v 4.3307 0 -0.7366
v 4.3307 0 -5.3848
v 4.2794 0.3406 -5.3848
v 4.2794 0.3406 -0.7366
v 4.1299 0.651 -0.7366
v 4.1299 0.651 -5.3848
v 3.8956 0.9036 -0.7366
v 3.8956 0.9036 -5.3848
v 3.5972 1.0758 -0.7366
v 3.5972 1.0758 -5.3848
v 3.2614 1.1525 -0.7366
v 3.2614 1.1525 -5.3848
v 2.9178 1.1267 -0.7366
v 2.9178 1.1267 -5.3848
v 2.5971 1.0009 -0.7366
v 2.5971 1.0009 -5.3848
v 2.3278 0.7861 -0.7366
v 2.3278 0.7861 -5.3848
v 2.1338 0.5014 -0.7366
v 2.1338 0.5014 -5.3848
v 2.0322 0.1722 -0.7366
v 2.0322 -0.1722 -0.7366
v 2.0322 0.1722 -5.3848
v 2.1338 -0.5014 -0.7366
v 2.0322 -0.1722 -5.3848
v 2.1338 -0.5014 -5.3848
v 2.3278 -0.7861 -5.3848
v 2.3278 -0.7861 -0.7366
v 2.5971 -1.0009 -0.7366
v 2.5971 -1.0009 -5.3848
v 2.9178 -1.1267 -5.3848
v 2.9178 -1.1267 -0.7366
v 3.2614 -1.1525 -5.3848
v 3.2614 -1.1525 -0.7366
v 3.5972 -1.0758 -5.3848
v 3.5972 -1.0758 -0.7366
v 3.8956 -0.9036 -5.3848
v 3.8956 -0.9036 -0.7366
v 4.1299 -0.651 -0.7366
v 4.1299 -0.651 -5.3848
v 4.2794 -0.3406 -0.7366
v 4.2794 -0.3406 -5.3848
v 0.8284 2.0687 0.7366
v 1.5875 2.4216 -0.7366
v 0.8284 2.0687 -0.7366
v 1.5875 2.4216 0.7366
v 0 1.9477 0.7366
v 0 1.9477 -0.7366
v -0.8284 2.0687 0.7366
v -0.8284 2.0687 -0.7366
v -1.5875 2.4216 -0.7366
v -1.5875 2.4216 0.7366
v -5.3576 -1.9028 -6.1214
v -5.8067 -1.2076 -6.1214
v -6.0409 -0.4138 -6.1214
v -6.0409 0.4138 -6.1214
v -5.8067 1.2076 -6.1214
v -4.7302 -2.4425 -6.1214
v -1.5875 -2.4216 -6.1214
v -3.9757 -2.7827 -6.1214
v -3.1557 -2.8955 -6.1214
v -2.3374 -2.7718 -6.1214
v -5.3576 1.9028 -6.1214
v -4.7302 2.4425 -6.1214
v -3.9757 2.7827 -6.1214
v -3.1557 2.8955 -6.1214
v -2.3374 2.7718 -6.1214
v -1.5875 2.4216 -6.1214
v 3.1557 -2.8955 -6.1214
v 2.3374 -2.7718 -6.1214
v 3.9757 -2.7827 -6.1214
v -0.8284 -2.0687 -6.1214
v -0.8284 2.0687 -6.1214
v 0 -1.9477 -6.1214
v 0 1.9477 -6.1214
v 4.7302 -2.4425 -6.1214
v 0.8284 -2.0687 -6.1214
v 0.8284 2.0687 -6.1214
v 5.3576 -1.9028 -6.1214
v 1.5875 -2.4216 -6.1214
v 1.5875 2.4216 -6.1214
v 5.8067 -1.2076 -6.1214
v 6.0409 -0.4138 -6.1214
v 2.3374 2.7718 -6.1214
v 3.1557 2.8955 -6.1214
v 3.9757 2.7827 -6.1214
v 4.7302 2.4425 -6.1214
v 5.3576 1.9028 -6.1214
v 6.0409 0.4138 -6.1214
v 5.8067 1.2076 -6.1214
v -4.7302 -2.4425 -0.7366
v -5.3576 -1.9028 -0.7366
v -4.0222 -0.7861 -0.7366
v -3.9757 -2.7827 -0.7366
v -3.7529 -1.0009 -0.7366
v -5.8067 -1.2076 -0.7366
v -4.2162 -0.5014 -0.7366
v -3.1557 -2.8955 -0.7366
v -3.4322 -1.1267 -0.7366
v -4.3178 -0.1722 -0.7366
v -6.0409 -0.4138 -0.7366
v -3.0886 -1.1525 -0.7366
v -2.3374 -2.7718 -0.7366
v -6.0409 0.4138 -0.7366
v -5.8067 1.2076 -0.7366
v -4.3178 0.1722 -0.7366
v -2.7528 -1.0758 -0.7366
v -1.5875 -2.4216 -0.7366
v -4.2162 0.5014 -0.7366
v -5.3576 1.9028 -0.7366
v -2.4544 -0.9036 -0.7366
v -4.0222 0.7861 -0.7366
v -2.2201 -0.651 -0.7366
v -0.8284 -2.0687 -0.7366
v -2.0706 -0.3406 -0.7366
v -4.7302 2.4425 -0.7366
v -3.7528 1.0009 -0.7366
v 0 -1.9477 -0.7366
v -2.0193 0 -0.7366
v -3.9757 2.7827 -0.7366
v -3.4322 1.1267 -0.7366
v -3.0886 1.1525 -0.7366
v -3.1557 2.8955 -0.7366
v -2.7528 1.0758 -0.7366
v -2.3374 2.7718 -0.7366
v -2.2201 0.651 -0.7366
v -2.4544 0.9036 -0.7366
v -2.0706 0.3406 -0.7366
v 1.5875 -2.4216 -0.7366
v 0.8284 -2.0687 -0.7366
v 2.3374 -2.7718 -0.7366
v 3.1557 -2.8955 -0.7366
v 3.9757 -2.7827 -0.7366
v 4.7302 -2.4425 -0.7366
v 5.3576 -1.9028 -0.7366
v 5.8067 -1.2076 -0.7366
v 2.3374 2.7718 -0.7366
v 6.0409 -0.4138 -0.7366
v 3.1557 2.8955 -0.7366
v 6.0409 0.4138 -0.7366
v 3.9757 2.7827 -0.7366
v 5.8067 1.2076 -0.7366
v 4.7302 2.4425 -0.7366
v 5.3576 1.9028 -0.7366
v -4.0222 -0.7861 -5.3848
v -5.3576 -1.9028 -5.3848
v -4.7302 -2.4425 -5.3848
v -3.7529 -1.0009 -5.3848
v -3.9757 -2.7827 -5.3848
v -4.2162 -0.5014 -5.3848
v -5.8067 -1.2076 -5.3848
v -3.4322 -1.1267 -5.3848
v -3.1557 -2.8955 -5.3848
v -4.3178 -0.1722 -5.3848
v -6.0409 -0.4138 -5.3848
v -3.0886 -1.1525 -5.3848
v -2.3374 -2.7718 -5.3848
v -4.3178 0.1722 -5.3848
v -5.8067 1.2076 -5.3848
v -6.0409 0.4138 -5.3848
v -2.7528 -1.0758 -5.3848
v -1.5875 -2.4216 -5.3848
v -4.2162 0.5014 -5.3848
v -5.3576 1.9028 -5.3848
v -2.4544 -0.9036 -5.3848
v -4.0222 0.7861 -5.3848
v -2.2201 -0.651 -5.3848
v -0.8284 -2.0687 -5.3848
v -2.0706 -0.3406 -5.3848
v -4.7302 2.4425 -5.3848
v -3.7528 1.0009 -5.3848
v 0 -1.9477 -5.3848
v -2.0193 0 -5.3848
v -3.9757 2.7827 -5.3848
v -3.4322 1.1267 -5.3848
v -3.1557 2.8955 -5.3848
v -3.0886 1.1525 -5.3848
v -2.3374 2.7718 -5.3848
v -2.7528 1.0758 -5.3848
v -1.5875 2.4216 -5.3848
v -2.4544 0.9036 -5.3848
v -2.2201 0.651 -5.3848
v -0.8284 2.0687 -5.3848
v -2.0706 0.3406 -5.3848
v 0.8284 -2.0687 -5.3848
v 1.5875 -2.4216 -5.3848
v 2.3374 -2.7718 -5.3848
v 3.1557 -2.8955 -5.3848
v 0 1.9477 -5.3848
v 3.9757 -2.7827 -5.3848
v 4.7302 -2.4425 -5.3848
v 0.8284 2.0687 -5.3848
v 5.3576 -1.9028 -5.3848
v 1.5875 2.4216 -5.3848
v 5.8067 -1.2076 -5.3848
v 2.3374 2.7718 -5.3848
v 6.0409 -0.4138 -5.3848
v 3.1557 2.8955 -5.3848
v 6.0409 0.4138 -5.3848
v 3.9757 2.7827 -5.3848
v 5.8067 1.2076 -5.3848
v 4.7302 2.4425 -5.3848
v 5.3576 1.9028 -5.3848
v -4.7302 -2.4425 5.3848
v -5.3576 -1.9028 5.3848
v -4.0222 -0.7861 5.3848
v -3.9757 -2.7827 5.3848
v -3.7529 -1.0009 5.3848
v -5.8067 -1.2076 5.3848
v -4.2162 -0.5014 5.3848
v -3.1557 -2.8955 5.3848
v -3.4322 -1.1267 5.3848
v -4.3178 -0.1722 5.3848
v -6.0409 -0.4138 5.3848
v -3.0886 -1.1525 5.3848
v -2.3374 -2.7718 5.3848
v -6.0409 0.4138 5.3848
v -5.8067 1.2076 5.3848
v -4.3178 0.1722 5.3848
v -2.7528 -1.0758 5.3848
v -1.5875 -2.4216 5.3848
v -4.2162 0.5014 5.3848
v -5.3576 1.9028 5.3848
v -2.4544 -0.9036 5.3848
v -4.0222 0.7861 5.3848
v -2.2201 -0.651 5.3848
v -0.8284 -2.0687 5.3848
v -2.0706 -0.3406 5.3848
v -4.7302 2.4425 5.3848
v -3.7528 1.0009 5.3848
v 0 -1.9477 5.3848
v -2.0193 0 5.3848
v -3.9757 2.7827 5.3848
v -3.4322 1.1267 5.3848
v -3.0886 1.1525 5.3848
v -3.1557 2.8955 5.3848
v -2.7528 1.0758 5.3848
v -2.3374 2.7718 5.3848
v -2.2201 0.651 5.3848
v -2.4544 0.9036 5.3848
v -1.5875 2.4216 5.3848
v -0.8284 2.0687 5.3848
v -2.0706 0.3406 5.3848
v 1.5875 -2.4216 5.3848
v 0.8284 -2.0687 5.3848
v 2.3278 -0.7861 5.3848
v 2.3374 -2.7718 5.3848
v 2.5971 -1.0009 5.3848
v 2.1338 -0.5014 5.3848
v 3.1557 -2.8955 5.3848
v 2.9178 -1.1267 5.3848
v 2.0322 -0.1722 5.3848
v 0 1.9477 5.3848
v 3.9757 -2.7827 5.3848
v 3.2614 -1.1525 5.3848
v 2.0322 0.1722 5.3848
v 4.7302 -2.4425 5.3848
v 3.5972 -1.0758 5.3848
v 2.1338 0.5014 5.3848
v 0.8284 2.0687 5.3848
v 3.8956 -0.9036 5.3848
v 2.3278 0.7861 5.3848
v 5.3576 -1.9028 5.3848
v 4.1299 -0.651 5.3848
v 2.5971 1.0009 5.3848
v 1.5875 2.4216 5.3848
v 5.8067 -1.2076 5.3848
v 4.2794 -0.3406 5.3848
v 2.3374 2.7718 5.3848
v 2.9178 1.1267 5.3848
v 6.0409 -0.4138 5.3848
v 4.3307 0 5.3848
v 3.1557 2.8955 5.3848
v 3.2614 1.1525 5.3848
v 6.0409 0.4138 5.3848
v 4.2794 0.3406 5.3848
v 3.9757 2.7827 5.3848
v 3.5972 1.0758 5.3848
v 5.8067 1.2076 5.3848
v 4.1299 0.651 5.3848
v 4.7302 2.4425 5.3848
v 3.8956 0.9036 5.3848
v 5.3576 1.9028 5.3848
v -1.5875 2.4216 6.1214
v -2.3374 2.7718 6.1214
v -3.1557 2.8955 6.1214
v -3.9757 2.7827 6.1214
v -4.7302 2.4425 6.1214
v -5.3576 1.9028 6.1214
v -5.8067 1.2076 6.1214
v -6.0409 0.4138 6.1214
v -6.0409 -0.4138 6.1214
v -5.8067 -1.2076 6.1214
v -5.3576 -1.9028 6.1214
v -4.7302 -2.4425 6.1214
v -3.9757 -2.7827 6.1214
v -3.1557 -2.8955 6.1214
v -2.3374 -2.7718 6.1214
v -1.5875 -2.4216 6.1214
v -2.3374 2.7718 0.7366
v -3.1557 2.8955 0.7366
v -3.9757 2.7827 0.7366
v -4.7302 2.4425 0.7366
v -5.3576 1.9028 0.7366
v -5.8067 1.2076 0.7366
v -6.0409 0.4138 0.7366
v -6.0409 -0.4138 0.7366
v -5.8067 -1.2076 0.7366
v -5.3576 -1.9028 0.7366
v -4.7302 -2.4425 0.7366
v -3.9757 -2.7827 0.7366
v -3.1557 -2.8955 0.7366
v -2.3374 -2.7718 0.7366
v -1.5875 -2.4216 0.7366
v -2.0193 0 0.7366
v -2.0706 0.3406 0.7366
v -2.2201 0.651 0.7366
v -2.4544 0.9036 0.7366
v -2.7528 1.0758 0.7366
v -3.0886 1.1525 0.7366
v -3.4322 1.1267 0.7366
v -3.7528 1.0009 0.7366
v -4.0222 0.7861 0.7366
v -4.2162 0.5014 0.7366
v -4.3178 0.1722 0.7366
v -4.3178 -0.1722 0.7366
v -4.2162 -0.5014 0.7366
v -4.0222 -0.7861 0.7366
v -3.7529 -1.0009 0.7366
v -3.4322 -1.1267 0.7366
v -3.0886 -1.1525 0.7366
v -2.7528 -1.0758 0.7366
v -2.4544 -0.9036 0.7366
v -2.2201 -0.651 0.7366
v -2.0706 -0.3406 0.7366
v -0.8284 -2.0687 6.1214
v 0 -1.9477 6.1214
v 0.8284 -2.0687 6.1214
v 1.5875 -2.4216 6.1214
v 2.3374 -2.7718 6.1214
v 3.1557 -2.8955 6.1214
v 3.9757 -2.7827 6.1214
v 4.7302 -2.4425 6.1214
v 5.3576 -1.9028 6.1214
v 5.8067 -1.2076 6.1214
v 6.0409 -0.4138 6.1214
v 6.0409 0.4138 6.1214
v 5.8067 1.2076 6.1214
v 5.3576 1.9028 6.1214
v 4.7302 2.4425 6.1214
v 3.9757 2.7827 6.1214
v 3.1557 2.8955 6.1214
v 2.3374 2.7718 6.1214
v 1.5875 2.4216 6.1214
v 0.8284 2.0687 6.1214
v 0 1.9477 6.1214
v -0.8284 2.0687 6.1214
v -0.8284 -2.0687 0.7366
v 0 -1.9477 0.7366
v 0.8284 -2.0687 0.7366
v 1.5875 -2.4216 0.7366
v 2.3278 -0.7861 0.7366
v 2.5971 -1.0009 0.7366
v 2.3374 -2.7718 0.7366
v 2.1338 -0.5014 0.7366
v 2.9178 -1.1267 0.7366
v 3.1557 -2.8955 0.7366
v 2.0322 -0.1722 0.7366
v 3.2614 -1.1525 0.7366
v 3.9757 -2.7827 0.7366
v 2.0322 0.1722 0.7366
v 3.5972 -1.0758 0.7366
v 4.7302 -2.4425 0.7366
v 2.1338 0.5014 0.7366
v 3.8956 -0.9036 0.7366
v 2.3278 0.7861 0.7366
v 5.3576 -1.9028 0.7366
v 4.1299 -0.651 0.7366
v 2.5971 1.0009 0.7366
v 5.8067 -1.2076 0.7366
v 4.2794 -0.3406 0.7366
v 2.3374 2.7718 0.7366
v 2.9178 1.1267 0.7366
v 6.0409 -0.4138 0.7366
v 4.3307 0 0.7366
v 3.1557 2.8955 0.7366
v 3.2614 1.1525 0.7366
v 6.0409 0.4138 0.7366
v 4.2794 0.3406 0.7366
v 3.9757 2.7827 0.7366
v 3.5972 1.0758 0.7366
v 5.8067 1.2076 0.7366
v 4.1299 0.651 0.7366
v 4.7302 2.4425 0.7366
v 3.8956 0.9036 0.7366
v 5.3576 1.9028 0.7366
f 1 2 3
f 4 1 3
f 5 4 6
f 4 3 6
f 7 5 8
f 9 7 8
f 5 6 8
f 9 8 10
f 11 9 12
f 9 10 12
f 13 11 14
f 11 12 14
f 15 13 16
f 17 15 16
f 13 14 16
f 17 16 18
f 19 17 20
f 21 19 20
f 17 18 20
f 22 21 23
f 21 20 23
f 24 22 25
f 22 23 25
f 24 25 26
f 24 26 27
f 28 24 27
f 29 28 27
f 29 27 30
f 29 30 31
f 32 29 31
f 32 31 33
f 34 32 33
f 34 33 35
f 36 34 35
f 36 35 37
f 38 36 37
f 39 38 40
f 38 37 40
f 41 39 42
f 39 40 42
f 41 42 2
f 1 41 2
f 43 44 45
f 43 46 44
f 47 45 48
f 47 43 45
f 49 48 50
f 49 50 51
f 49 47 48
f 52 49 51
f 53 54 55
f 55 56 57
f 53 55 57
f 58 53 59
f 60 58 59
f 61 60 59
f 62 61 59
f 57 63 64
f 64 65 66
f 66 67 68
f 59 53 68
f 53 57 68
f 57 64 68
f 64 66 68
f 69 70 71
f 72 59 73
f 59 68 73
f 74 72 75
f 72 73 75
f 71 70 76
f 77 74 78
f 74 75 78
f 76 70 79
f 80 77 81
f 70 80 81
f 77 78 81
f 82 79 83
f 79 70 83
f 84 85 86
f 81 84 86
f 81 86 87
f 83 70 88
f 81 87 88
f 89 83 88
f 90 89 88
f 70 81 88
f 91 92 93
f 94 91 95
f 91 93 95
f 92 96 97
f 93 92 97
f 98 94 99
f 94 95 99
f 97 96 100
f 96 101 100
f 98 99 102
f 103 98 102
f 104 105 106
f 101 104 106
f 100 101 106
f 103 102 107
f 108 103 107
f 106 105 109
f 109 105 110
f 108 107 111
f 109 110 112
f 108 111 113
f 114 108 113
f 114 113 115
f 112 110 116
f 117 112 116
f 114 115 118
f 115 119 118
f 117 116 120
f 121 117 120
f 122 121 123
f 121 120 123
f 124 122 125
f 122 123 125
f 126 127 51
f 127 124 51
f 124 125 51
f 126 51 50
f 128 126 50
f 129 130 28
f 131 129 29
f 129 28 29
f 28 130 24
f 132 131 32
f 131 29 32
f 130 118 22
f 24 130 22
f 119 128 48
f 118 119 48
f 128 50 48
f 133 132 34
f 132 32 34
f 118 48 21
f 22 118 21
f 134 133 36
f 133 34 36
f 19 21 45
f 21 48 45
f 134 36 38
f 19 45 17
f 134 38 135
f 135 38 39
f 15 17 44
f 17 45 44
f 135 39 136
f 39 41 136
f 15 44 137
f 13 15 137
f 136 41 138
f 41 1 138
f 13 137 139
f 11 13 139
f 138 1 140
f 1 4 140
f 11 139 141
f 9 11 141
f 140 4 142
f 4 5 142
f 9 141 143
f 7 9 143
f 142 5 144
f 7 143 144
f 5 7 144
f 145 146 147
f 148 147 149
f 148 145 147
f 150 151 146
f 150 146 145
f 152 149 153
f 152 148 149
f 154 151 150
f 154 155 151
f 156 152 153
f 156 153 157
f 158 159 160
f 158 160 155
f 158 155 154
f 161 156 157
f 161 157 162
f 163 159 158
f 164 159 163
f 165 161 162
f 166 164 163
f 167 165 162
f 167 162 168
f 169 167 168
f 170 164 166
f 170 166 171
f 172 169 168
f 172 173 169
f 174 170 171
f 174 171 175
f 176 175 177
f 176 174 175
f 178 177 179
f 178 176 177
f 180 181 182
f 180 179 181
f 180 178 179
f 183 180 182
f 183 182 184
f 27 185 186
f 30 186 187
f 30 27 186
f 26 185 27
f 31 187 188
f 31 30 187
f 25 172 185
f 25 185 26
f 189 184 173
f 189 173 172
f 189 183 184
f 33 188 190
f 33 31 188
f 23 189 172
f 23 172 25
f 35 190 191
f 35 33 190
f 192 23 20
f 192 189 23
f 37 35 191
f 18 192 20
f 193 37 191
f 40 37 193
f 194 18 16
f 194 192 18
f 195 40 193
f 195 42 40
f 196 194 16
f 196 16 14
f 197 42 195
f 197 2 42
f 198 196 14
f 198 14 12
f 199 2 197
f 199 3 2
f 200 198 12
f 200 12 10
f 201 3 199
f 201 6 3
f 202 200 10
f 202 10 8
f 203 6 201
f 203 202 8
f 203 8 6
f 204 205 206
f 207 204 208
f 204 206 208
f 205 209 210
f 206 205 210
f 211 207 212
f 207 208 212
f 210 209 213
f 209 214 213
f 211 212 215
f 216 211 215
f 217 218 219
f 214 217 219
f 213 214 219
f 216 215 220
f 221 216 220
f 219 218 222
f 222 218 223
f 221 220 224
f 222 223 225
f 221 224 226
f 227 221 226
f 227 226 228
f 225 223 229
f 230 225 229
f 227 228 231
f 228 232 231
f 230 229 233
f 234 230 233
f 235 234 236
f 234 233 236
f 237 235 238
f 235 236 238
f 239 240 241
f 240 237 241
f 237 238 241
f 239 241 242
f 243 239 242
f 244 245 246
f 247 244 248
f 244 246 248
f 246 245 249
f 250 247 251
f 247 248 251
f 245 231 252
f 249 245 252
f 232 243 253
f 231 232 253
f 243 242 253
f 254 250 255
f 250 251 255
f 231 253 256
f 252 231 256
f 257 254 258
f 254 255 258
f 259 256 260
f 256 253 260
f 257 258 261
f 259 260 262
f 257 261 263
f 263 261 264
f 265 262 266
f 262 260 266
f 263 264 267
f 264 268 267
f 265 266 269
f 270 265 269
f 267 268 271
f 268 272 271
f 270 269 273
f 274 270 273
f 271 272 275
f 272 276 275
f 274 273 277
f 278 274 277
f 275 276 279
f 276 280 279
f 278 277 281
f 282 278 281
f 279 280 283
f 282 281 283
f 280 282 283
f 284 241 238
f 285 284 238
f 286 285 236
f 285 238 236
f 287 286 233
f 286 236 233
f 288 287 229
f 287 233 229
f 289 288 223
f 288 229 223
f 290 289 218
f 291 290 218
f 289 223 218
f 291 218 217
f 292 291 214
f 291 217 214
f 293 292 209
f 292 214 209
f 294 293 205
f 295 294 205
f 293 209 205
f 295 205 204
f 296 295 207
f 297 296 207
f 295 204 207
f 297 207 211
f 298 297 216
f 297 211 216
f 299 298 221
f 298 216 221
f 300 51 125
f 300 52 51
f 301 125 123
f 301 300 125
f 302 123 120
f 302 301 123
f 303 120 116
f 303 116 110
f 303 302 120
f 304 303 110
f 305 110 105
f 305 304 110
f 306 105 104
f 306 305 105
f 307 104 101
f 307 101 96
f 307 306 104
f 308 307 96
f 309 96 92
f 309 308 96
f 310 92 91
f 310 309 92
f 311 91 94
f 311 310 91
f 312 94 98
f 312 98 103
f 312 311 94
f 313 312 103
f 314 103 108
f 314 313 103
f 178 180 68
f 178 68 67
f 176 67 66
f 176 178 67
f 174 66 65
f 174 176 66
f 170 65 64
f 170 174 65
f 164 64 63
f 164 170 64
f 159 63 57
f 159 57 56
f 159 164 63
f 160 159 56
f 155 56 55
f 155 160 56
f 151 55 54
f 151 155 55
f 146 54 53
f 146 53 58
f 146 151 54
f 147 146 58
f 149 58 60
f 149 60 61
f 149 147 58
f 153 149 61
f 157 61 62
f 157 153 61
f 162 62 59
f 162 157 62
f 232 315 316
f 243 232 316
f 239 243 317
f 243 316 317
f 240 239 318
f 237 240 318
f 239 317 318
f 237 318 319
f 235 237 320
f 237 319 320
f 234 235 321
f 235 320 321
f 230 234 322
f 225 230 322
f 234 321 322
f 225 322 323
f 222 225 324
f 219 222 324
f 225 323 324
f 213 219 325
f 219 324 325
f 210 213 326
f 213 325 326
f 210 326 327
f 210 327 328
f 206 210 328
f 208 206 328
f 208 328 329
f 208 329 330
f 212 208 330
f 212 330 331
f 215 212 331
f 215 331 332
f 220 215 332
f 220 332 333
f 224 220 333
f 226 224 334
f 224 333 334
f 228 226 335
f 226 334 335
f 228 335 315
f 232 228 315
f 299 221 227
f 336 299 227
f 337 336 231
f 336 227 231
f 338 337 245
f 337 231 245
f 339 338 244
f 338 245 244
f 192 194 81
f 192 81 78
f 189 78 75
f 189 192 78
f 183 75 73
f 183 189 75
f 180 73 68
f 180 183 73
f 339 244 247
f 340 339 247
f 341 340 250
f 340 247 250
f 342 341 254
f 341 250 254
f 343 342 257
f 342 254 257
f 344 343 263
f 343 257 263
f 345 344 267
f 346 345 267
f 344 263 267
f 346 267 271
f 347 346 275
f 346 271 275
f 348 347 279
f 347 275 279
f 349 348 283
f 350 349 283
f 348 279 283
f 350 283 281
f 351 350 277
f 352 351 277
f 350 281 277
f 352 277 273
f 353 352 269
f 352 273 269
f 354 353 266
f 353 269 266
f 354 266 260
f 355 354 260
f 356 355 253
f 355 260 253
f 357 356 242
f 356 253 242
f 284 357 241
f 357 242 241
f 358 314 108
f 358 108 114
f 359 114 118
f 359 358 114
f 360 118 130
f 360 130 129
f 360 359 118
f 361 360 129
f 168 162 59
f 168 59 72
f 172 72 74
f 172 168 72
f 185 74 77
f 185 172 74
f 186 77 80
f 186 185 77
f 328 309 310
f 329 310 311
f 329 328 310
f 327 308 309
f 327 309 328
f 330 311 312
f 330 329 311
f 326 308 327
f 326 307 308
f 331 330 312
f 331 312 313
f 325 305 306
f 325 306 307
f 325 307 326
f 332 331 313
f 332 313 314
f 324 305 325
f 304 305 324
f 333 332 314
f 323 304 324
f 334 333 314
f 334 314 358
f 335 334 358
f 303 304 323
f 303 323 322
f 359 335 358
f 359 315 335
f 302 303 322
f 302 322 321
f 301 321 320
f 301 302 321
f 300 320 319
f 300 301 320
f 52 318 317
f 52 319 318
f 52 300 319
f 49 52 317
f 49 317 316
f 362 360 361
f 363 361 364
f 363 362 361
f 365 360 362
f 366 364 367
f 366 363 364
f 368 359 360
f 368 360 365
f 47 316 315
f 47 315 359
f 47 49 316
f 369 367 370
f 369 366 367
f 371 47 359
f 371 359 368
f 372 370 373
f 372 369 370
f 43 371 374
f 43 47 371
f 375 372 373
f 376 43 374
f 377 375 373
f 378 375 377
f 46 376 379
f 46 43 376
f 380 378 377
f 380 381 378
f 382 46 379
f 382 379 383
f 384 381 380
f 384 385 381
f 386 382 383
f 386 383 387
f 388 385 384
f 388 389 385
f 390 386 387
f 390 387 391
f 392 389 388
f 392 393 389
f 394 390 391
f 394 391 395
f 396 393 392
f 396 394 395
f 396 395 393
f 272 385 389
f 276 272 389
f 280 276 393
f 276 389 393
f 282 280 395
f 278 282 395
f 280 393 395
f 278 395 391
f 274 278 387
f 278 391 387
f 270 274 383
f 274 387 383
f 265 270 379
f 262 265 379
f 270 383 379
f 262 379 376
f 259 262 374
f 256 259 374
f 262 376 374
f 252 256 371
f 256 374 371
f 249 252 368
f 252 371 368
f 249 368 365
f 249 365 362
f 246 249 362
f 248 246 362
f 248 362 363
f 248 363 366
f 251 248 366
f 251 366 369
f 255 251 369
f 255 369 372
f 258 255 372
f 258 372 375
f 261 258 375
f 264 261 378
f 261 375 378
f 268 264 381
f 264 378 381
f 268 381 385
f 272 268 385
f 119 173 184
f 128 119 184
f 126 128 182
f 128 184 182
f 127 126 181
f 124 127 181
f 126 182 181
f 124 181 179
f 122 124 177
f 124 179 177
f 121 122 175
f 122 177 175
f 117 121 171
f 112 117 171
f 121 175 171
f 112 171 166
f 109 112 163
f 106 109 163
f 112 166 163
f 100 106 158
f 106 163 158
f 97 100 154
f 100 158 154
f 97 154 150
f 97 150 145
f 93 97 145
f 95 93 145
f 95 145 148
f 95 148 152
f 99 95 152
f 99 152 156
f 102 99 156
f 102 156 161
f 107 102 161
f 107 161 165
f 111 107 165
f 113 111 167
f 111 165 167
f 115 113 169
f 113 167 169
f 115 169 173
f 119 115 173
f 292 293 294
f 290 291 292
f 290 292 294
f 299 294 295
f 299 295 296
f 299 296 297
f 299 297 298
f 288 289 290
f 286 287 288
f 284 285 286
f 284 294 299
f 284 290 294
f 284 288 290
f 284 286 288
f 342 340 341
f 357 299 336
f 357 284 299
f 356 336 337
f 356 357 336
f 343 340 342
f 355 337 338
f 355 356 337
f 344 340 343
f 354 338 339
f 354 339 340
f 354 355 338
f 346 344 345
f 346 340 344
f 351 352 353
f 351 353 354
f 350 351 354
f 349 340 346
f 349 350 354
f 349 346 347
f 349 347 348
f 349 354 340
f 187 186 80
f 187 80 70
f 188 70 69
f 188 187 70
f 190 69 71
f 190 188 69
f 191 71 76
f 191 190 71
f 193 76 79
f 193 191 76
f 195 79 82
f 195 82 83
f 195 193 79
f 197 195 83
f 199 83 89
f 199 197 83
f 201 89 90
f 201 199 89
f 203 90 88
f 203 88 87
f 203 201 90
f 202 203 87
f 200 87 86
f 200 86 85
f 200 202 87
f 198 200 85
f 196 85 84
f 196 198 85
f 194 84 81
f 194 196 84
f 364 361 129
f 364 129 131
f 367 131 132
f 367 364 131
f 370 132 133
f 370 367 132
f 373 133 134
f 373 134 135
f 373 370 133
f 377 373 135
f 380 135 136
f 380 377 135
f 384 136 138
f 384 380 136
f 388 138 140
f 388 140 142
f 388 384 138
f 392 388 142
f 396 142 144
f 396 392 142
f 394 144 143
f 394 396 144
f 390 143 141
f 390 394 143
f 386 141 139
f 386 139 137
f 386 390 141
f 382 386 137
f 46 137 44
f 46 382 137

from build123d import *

# Parameters (mm, degrees)
BOSS_EXTRUDE1_DEPTH = 0.7366
BOSS_EXTRUDE2_START = 5.3848
BOSS_EXTRUDE2_DEPTH = 0.7366
SKETCH2_R           = 1.1557
BOSS_EXTRUDE3_DEPTH = 4.6482
BOSS_EXTRUDE4_START = -5.3848
BOSS_EXTRUDE4_DEPTH = 0.7366
BOSS_EXTRUDE5_START = -6.1214
SKETCH2_2_R         = 1.1557
BOSS_EXTRUDE5_DEPTH = 4.6482


with BuildPart() as part:
    # Sketch1 → Boss-Extrude1 (new, symmetric)
    with BuildSketch(Plane.XY):
        with BuildLine():
            ThreePointArc((-1.5875, 2.421640582), (-6.0706, 0), (-1.5875, -2.421640582))
            ThreePointArc((-1.5875, -2.421640582), (0, -1.947681165), (1.5875, -2.421640582))
            ThreePointArc((1.5875, -2.421640582), (6.0706, 0), (1.5875, 2.421640582))
            ThreePointArc((1.5875, 2.421640582), (0, 1.947681165), (-1.5875, 2.421640582))
        make_face()
    extrude(amount=BOSS_EXTRUDE1_DEPTH, both=True)



with BuildPart() as body_2:
    # Sketch1<2> → Boss-Extrude2 (new body)
    with BuildSketch(Plane.XY.offset(BOSS_EXTRUDE2_START)):
        with BuildLine():
            ThreePointArc((-1.5875, 2.421640582), (-6.0706, 0), (-1.5875, -2.421640582))
            ThreePointArc((-1.5875, -2.421640582), (0, -1.947681165), (1.5875, -2.421640582))
            ThreePointArc((1.5875, -2.421640582), (6.0706, 0), (1.5875, 2.421640582))
            ThreePointArc((1.5875, 2.421640582), (0, 1.947681165), (-1.5875, 2.421640582))
        make_face()
    extrude(amount=BOSS_EXTRUDE2_DEPTH)


with BuildPart() as part_1:
    add(part.part)

    add(body_2.part)  # Boss-Extrude3 merges body 2
    # Sketch2 → Boss-Extrude3 (add)
    with BuildSketch(Plane.XY.offset(0.7366)):
        with Locations((-3.175, 0)):
            Circle(SKETCH2_R)
        with Locations((3.175, 0)):
            Circle(SKETCH2_R)
    extrude(amount=BOSS_EXTRUDE3_DEPTH)



with BuildPart() as body_2_2:
    # Sketch1<3> → Boss-Extrude4 (new body)
    with BuildSketch(Plane.XY.offset(BOSS_EXTRUDE4_START)):
        with BuildLine():
            ThreePointArc((-1.5875, 2.421640582), (-6.0706, 0), (-1.5875, -2.421640582))
            ThreePointArc((-1.5875, -2.421640582), (0, -1.947681165), (1.5875, -2.421640582))
            ThreePointArc((1.5875, -2.421640582), (6.0706, 0), (1.5875, 2.421640582))
            ThreePointArc((1.5875, 2.421640582), (0, 1.947681165), (-1.5875, 2.421640582))
        make_face()
    extrude(amount=-BOSS_EXTRUDE4_DEPTH)


with BuildPart() as part_2:
    add(part_1.part)

    add(body_2_2.part)  # Boss-Extrude5 merges body 2 2
    # Sketch2<2> → Boss-Extrude5 (add)
    with BuildSketch(Plane.XY.offset(0.7366).offset(BOSS_EXTRUDE5_START)):
        with Locations((-3.175, 0)):
            Circle(SKETCH2_2_R)
        with Locations((3.175, 0)):
            Circle(SKETCH2_2_R)
    extrude(amount=BOSS_EXTRUDE5_DEPTH)


solid = part_2.part
